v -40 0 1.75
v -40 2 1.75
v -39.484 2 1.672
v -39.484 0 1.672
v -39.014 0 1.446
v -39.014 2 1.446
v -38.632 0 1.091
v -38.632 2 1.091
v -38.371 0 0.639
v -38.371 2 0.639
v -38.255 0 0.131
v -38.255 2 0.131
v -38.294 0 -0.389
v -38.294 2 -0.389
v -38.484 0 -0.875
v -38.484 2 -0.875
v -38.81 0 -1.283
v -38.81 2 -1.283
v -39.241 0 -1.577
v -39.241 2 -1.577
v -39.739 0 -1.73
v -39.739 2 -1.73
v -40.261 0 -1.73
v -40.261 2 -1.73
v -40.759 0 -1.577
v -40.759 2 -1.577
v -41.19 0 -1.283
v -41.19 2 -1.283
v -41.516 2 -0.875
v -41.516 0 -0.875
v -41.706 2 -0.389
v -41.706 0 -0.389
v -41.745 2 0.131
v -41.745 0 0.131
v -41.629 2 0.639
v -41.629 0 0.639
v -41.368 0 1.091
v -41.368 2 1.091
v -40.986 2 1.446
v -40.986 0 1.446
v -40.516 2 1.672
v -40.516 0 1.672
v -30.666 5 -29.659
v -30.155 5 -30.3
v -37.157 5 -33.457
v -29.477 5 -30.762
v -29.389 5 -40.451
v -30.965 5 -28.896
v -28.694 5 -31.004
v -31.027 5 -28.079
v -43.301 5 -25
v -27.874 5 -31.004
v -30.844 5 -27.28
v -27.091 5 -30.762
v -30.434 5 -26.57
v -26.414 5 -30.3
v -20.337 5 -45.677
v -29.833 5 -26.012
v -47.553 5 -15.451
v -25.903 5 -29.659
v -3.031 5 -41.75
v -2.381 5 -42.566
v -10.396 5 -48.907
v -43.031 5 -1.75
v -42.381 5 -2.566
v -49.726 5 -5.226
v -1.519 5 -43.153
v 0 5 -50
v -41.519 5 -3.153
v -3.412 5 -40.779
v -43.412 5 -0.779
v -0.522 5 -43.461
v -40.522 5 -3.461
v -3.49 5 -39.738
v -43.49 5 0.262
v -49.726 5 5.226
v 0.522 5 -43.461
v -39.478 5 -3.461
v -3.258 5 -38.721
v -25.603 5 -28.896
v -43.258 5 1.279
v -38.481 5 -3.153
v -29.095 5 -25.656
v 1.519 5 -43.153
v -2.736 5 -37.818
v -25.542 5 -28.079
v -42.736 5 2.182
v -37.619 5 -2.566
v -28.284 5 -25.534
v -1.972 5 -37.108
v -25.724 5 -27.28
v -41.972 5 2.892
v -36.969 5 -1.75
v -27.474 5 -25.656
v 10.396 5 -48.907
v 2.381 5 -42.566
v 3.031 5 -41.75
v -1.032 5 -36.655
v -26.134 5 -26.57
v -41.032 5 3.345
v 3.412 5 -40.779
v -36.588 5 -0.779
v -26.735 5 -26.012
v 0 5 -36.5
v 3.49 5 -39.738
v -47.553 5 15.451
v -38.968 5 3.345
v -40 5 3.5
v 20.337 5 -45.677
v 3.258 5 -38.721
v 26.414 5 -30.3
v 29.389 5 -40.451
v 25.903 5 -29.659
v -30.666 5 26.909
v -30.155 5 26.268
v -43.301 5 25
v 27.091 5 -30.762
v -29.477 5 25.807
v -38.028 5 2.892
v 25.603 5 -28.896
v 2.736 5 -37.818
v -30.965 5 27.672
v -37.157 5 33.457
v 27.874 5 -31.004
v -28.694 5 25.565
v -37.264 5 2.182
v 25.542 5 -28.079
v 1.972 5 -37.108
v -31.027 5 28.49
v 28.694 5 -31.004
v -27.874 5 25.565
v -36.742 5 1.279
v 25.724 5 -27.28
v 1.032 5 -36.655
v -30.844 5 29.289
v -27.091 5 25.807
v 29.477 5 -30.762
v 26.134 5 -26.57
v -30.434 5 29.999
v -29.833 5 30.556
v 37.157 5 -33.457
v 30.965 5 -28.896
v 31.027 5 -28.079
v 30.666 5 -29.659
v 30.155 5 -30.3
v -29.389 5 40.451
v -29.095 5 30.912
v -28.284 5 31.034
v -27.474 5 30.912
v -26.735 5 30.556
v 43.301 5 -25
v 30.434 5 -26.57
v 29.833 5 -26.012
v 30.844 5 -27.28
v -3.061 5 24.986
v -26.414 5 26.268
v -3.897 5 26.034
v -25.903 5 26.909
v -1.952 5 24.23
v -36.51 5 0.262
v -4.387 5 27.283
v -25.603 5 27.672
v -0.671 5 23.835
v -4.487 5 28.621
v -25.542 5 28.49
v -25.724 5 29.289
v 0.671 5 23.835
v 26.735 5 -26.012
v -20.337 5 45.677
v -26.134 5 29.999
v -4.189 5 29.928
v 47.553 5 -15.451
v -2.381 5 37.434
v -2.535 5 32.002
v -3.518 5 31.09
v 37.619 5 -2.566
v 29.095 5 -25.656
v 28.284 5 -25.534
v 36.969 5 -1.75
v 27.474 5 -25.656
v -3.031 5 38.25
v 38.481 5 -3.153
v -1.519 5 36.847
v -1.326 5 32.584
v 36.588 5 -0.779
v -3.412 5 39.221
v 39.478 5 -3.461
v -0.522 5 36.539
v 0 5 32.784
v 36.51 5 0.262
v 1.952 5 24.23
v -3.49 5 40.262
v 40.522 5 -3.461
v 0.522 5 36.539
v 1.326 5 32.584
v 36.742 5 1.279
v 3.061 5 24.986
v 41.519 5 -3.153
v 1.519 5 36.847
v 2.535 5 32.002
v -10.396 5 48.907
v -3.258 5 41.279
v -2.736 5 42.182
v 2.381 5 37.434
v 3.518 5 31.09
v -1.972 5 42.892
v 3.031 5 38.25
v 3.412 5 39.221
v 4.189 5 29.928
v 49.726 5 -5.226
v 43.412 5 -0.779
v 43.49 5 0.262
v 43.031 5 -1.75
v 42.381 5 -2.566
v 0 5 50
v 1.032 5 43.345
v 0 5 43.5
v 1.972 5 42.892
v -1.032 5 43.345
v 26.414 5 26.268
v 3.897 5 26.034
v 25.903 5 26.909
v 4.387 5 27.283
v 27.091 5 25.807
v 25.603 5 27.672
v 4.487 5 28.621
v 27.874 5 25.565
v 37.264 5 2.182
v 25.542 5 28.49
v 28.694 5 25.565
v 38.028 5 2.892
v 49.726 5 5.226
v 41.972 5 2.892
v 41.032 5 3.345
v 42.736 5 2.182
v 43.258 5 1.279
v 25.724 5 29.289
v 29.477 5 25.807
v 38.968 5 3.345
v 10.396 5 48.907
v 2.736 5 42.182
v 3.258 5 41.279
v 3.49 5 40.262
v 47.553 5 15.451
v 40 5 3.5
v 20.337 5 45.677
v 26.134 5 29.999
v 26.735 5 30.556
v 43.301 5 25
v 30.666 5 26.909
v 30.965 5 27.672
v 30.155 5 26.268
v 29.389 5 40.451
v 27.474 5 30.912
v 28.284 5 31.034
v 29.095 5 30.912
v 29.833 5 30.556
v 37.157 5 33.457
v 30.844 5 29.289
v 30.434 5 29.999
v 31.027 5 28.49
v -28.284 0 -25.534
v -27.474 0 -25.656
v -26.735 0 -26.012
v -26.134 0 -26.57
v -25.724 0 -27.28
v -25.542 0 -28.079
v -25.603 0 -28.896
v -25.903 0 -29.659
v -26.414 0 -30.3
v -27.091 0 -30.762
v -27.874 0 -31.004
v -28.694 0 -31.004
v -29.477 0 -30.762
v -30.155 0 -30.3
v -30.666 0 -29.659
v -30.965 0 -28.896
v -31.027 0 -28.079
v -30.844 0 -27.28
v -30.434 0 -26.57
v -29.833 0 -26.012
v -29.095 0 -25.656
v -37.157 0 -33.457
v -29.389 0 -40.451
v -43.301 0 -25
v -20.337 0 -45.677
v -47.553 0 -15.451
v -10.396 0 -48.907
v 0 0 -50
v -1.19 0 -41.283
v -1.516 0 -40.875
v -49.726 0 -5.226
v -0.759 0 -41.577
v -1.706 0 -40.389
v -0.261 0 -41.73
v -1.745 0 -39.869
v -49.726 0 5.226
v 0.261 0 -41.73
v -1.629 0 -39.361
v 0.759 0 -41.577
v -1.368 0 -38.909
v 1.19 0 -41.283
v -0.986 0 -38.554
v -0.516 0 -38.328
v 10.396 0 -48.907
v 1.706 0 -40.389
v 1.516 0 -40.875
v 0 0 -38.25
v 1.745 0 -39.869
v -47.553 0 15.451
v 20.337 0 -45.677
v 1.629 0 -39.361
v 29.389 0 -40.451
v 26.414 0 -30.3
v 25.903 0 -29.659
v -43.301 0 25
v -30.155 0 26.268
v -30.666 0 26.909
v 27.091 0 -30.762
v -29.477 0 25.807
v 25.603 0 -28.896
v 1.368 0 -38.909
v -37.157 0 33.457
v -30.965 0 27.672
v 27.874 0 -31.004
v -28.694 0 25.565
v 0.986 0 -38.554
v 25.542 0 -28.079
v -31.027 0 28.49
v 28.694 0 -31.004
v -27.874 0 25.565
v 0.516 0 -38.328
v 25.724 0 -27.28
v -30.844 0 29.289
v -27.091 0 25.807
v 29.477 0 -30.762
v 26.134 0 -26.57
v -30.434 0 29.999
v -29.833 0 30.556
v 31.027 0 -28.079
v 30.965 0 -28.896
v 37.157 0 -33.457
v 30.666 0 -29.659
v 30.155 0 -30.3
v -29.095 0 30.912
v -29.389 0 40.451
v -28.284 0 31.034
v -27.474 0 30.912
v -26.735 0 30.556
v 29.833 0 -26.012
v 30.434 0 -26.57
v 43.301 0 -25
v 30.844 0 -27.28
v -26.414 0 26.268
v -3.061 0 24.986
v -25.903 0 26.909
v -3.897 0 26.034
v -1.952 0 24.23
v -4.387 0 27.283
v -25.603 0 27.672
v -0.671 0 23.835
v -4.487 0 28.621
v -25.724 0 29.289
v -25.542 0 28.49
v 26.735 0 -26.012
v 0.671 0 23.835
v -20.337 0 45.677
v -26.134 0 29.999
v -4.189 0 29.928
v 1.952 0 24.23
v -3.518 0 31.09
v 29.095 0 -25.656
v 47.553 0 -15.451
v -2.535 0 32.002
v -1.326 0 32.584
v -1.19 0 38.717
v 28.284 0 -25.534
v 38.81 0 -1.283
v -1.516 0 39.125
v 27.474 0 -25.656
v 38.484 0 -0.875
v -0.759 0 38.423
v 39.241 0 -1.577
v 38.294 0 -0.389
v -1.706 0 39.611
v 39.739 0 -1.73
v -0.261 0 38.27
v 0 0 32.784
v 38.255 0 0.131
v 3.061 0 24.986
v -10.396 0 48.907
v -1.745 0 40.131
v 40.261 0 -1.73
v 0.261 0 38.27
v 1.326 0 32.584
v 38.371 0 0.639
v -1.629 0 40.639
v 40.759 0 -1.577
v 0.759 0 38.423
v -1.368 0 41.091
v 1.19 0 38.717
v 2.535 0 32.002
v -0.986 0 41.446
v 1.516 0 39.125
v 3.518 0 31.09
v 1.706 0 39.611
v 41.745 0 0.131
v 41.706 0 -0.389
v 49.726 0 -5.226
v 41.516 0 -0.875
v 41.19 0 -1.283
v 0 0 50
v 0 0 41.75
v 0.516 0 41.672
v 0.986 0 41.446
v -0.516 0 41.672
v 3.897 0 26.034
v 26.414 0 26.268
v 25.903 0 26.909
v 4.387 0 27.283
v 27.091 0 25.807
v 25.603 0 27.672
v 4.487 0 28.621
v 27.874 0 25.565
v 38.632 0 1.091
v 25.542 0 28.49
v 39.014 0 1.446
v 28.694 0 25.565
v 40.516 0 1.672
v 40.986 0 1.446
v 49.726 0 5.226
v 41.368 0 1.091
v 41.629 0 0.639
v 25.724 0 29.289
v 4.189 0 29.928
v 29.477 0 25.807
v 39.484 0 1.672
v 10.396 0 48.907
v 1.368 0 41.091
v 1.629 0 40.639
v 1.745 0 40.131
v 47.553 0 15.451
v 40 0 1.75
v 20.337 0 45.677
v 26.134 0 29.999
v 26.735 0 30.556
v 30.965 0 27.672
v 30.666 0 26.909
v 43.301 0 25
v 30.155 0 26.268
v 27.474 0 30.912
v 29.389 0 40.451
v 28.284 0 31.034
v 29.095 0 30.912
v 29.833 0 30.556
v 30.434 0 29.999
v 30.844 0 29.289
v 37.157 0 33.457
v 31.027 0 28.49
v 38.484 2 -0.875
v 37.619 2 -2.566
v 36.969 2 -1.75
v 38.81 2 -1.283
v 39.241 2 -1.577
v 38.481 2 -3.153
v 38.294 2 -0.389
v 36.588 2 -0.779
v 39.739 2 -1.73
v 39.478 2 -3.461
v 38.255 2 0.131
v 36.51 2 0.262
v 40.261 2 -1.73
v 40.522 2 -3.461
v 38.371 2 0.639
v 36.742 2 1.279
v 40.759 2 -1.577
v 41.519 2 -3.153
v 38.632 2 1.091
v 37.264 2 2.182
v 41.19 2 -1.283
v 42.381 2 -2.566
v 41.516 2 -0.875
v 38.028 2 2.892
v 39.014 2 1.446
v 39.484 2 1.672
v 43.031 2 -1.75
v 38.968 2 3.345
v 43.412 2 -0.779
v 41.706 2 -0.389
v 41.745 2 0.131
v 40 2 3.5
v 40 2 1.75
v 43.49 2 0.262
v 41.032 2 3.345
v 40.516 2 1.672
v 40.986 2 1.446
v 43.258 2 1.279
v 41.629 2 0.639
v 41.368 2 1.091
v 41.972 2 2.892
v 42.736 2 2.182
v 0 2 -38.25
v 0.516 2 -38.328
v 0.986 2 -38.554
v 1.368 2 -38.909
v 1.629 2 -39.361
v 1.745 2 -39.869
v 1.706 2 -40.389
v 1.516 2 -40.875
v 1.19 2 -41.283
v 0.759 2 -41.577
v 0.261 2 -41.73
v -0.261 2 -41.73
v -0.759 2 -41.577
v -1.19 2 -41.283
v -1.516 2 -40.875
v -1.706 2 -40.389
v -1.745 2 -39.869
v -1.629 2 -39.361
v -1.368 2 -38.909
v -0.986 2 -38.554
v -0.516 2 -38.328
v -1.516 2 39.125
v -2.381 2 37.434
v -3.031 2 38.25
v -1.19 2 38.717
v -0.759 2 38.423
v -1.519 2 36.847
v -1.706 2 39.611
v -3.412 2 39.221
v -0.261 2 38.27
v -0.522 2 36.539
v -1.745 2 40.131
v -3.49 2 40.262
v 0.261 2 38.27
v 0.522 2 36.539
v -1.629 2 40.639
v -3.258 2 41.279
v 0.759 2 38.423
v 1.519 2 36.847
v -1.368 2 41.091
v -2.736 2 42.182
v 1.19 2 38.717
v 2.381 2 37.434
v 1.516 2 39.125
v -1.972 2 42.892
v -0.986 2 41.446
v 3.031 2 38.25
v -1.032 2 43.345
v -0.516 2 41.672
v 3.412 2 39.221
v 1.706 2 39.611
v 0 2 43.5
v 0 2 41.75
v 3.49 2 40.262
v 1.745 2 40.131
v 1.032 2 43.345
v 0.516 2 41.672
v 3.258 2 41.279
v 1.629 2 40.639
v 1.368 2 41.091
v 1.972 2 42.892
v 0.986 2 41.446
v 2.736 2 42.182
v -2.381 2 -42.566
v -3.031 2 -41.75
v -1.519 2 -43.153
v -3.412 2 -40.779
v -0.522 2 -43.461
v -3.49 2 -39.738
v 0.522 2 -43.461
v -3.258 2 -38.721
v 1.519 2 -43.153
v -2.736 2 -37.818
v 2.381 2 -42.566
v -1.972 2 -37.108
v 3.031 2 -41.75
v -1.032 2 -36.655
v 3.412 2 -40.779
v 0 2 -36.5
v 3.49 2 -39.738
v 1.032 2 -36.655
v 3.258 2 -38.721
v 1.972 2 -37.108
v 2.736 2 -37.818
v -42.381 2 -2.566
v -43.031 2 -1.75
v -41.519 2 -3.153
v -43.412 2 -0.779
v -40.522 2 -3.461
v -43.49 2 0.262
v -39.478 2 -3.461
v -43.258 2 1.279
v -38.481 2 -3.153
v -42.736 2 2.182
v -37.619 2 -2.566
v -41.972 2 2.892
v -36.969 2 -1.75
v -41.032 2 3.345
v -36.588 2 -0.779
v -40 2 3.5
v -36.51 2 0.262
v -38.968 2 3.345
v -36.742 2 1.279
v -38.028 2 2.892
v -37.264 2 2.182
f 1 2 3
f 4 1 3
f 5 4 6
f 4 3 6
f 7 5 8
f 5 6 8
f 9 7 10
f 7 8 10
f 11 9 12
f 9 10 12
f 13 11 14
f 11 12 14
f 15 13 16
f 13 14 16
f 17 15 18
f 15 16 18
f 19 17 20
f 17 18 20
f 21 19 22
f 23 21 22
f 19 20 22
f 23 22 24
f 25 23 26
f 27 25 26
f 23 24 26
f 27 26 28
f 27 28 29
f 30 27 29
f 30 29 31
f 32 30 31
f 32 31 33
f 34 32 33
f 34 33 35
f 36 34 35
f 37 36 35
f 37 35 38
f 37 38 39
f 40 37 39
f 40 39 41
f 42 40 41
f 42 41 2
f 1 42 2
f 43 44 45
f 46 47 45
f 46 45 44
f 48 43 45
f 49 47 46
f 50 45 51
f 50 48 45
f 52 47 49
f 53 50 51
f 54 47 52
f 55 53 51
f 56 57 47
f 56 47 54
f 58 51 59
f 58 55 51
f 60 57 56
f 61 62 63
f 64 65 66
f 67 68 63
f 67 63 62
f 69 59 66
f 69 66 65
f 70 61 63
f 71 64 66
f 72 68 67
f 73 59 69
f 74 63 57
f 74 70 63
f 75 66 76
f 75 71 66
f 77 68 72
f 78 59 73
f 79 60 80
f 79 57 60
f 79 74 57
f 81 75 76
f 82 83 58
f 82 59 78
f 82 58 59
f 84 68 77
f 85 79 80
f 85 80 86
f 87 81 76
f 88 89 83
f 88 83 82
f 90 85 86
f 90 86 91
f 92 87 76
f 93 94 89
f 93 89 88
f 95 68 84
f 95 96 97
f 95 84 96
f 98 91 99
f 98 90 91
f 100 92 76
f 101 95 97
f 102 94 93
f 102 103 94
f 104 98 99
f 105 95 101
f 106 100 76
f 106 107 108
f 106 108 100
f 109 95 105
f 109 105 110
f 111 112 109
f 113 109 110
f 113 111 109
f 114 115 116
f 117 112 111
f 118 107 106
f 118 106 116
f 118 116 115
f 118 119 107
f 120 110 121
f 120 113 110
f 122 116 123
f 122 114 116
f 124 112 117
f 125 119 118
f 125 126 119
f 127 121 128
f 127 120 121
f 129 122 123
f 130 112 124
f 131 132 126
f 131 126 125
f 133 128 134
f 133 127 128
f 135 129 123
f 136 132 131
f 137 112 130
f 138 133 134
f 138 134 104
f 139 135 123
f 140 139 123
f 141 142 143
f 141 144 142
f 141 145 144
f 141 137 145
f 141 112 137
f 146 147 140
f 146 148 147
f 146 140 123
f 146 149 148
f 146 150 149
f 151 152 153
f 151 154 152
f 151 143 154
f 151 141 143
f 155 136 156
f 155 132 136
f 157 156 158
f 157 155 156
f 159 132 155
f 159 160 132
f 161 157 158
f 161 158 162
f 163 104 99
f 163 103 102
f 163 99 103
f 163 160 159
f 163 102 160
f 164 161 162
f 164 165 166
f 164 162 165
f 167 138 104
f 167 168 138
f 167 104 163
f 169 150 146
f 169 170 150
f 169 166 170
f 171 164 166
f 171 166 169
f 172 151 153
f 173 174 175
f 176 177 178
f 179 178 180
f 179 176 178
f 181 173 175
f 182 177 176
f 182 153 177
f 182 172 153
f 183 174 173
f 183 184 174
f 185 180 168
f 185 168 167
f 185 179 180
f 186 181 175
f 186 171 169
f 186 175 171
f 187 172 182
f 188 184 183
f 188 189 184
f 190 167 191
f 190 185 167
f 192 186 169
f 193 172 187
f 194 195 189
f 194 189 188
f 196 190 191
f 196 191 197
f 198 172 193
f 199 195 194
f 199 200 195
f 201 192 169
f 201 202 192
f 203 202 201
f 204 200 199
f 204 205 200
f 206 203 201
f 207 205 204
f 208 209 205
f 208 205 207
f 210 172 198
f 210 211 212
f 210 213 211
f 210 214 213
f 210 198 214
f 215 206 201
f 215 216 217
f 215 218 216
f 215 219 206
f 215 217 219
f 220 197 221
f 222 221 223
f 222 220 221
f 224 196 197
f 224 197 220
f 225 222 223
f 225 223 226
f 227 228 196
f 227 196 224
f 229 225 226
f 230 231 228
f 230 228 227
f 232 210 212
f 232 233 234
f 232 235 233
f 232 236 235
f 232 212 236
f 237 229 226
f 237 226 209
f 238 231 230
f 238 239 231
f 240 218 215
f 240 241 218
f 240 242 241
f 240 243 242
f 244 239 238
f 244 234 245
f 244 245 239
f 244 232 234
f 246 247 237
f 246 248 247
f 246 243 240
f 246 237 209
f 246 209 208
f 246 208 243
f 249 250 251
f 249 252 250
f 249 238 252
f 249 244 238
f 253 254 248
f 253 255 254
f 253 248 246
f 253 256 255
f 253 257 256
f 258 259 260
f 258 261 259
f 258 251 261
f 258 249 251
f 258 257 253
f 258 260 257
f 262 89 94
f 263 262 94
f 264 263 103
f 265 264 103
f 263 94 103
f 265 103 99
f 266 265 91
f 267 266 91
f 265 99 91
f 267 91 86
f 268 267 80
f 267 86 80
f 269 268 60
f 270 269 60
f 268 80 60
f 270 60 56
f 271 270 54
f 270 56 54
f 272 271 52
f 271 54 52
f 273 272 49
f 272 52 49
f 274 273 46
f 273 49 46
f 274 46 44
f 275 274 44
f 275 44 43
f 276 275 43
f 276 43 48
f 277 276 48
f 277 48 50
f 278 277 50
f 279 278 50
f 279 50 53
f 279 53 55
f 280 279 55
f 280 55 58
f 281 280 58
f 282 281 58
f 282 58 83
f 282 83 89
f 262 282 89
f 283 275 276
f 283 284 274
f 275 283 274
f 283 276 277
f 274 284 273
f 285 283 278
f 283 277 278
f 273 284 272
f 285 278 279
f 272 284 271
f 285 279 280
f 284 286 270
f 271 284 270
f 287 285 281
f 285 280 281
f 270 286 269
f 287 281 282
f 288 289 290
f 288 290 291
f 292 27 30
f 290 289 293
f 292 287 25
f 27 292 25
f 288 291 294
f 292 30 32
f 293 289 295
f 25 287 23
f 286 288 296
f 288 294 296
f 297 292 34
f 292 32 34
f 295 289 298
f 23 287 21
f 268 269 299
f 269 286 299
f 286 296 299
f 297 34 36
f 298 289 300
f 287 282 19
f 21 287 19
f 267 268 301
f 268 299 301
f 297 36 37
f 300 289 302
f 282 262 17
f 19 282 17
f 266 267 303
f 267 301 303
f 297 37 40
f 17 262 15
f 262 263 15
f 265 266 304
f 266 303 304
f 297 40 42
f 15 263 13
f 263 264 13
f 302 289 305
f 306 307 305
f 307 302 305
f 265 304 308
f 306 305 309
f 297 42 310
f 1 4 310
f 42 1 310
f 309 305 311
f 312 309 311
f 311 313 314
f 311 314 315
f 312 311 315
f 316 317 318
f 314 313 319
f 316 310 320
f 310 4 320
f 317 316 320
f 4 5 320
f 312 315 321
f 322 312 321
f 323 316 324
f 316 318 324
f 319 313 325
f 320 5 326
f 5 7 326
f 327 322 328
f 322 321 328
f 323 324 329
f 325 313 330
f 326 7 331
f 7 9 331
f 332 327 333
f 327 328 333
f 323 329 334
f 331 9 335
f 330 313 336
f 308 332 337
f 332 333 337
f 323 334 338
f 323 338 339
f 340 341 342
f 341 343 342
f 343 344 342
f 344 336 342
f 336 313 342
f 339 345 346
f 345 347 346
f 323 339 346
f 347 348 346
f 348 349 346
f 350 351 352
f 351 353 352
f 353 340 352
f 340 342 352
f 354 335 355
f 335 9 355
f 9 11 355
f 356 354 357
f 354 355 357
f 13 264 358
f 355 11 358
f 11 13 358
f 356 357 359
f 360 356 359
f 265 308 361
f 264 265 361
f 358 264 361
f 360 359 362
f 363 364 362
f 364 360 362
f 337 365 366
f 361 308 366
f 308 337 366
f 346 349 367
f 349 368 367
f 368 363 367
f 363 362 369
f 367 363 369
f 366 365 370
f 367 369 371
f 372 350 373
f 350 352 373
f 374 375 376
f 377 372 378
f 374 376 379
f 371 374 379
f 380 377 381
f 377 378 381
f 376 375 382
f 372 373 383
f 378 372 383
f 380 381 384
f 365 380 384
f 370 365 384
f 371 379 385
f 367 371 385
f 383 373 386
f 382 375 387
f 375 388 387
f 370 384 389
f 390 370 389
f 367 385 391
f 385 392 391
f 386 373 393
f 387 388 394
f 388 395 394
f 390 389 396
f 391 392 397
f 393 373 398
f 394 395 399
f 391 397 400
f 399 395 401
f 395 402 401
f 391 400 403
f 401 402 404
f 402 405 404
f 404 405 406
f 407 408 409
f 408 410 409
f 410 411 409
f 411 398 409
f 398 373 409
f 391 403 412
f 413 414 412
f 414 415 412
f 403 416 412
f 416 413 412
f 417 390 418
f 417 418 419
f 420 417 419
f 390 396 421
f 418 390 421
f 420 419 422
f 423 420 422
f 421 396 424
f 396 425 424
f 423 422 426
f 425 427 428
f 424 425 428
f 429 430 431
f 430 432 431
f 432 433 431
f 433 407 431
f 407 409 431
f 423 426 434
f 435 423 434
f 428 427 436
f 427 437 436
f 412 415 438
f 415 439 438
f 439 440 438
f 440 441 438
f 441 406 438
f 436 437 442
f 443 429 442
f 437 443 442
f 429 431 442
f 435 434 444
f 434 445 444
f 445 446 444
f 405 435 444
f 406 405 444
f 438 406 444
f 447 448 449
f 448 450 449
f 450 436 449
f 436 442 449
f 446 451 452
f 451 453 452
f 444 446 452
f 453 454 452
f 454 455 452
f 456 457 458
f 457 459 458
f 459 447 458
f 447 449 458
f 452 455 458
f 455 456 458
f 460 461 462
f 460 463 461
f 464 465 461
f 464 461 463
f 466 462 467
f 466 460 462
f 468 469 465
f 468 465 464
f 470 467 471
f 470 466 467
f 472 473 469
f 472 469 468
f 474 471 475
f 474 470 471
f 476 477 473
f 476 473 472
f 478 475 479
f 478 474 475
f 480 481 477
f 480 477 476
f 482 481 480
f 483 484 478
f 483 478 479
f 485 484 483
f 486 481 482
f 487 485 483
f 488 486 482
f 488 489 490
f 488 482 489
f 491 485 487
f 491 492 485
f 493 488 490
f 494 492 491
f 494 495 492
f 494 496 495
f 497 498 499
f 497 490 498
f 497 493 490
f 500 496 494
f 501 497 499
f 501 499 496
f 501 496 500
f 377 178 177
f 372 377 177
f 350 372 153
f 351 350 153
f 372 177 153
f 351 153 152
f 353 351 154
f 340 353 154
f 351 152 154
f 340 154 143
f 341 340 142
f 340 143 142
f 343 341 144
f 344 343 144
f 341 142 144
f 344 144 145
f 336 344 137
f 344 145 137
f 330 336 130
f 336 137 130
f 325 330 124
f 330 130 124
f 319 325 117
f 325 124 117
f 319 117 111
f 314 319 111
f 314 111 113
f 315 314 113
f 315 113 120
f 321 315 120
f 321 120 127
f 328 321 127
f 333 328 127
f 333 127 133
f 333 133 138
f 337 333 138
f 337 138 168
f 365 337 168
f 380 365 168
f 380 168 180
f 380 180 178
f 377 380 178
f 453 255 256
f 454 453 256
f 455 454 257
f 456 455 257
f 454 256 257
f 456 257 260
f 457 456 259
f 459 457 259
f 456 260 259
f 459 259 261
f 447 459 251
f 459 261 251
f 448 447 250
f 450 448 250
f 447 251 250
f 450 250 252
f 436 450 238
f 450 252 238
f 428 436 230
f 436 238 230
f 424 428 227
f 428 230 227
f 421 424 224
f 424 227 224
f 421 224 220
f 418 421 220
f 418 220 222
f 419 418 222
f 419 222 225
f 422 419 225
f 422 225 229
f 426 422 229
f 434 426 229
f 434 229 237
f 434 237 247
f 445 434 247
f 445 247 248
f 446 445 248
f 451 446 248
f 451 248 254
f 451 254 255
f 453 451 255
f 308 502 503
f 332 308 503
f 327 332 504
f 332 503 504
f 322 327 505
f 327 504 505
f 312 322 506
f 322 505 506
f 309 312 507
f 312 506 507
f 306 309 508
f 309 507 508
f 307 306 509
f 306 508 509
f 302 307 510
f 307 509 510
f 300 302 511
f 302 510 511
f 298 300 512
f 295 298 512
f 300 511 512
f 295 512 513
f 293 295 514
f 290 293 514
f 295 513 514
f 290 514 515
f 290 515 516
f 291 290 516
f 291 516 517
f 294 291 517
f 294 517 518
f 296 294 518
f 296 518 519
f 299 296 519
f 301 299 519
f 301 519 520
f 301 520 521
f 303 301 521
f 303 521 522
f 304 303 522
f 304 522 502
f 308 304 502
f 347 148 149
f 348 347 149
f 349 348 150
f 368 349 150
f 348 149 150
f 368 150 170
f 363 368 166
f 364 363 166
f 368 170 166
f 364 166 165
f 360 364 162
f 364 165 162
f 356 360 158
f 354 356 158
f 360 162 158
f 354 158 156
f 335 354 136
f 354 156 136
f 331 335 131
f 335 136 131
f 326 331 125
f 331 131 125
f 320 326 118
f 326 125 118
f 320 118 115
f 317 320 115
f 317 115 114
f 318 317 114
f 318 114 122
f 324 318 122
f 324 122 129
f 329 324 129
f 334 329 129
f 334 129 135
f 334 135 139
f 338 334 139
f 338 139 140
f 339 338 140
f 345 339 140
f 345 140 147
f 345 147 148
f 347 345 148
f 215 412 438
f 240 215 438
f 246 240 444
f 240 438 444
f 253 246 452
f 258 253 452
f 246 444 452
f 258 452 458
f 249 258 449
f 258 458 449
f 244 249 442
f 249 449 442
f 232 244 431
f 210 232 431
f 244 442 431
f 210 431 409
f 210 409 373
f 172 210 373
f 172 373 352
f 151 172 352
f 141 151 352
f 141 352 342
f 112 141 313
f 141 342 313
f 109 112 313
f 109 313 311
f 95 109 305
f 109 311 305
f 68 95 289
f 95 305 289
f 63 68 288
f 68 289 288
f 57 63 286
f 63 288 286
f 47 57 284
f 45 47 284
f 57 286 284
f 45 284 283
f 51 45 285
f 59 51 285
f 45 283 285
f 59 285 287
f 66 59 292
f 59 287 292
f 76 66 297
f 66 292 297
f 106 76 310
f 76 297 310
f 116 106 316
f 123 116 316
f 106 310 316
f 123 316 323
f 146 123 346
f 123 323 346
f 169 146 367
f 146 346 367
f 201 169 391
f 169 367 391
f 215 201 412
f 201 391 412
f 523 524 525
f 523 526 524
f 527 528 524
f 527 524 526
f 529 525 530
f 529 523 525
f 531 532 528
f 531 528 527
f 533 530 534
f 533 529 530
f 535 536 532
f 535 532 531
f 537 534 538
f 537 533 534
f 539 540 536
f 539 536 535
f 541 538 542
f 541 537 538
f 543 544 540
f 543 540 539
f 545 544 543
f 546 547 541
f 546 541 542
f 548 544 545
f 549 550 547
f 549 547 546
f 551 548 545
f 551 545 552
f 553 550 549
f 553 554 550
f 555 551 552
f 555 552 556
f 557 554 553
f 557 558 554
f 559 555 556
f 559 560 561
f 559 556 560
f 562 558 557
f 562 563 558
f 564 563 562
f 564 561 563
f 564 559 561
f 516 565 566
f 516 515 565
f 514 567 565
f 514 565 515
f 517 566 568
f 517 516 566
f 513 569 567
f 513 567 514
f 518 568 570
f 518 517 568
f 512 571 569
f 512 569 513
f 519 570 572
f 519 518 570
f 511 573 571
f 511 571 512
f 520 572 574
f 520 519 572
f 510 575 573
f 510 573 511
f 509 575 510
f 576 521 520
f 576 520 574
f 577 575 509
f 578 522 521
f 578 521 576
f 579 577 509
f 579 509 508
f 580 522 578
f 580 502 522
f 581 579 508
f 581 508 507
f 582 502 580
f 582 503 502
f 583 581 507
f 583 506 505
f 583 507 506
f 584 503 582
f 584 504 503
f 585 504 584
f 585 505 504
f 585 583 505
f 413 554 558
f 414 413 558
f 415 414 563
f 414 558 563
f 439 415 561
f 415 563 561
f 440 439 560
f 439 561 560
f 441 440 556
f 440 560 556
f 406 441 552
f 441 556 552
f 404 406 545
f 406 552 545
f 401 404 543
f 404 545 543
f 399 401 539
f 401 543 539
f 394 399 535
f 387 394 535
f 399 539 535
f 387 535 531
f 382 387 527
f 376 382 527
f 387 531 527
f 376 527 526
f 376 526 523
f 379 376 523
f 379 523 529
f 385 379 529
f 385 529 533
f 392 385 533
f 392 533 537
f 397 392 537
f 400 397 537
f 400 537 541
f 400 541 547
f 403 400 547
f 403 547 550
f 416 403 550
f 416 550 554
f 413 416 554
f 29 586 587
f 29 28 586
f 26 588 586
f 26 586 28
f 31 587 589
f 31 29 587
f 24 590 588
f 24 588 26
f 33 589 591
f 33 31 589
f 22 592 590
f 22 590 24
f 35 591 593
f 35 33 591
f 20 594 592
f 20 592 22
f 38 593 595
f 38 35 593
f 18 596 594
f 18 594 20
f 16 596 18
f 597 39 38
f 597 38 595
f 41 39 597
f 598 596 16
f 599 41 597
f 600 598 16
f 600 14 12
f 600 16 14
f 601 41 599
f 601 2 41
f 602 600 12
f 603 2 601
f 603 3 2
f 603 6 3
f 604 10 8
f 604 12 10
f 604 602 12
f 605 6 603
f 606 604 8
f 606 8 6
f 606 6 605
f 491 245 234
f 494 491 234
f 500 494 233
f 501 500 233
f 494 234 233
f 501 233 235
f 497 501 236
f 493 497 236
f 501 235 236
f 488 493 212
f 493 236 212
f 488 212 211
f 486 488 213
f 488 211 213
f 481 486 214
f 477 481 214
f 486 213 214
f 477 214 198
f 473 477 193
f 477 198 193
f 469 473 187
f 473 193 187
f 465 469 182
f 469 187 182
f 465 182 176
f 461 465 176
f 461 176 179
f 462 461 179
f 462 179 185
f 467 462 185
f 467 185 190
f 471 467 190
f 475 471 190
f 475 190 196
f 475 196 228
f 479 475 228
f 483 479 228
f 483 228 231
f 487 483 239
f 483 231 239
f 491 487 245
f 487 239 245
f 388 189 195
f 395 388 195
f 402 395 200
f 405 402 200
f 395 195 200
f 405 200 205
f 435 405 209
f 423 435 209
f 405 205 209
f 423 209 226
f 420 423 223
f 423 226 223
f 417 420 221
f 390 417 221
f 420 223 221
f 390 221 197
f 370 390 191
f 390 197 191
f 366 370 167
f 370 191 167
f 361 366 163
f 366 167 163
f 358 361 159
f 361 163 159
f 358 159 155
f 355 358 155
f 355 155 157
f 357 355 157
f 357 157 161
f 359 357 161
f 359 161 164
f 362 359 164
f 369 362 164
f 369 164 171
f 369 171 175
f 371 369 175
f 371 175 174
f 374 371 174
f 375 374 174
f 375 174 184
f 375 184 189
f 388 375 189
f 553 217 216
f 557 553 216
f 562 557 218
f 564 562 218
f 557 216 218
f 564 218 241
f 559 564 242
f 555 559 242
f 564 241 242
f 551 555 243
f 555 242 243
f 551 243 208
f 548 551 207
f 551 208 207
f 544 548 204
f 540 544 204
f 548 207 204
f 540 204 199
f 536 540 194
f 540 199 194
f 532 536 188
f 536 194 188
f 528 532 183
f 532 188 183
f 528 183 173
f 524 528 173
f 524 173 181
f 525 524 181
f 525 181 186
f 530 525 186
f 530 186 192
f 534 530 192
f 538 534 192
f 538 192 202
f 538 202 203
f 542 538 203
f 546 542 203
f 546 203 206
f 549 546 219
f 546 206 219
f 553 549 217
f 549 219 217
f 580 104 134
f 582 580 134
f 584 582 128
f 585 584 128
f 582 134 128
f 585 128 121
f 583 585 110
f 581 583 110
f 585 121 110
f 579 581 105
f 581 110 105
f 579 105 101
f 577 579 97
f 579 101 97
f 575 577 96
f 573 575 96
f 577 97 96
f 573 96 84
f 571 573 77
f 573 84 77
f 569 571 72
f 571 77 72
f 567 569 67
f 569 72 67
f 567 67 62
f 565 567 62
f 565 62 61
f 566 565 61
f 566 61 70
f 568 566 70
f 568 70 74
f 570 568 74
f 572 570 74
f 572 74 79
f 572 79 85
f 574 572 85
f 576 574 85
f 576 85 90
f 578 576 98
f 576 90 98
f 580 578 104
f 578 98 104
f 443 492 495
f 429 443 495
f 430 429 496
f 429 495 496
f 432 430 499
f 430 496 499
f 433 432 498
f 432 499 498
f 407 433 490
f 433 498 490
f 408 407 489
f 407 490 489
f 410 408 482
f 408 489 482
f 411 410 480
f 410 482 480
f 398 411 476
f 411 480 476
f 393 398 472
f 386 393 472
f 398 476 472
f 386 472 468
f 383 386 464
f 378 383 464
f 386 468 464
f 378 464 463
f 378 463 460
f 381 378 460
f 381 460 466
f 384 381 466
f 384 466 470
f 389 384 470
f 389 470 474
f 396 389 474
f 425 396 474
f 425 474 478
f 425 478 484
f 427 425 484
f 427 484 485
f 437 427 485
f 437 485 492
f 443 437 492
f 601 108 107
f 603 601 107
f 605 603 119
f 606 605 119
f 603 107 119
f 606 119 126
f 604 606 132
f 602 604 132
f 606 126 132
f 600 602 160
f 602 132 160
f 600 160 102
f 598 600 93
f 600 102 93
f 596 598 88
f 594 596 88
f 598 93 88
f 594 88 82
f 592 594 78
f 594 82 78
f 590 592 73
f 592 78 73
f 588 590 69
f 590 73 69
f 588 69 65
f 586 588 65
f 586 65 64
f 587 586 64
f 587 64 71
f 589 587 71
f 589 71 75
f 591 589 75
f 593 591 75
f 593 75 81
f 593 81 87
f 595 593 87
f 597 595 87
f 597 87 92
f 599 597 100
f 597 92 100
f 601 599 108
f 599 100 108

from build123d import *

# Parameters (mm, degrees)
SKETCH_1_R          = 50
EXTRUDE_1_DEPTH     = 5
SKETCH_2_R          = 1.75
CUT_EXTRUDE_1_DEPTH = 12
SKETCH_3_R          = 3.5
CUT_EXTRUDE_2_DEPTH = 3
SKETCH_4_R          = 2.75
CUT_EXTRUDE_3_DEPTH = 24
SKETCH_5_R          = 4.5
CUT_EXTRUDE_4_DEPTH = 16


with BuildPart() as part:
    # 草图1 → 凸台-拉伸1 (new body)
    with BuildSketch(Plane(origin=(0, 0, 0), x_dir=(1, 0, 0), z_dir=(0, 1, 0))):
        with Locations(Location((0, 0, 0), (0, 0, 270))):
            Circle(SKETCH_1_R)
    extrude(amount=EXTRUDE_1_DEPTH)

    # 草图2 → 切除-拉伸1 (cut)
    with BuildSketch(Plane(origin=(0, 5, 0), x_dir=(1, 0, 0), z_dir=(0, 1, 0))):
        with Locations(Location((0, 40, 0), (0, 0, 270))):
            Circle(SKETCH_2_R)
        with Locations(Location((40, 0, 0), (0, 0, 270))):
            Circle(SKETCH_2_R)
        with Locations(Location((0, -40, 0), (0, 0, 270))):
            Circle(SKETCH_2_R)
        with Locations(Location((-40, 0, 0), (0, 0, 270))):
            Circle(SKETCH_2_R)
    extrude(amount=-CUT_EXTRUDE_1_DEPTH, mode=Mode.SUBTRACT)

    # 草图3 → 切除-拉伸2 (cut)
    with BuildSketch(Plane(origin=(0, 5, 0), x_dir=(1, 0, 0), z_dir=(0, 1, 0))):
        with Locations(Location((0, 40, 0), (0, 0, 270))):
            Circle(SKETCH_3_R)
        with Locations(Location((40, 0, 0), (0, 0, 270))):
            Circle(SKETCH_3_R)
        with Locations(Location((0, -40, 0), (0, 0, 270))):
            Circle(SKETCH_3_R)
        with Locations(Location((-40, 0, 0), (0, 0, 270))):
            Circle(SKETCH_3_R)
    extrude(amount=-CUT_EXTRUDE_2_DEPTH, mode=Mode.SUBTRACT)

    # 草图4 → 切除-拉伸3 (cut)
    with BuildSketch(Plane(origin=(0, 5, 0), x_dir=(1, 0, 0), z_dir=(0, 1, 0))):
        with Locations(Location((28.284271247, 28.284271247, 0), (0, 0, 270))):
            Circle(SKETCH_4_R)
        with Locations(Location((28.284271247, -28.284271247, 0), (0, 0, 270))):
            Circle(SKETCH_4_R)
        with Locations(Location((-28.284271247, -28.284271247, 0), (0, 0, 270))):
            Circle(SKETCH_4_R)
        with Locations(Location((-28.284271247, 28.284271247, 0), (0, 0, 270))):
            Circle(SKETCH_4_R)
    extrude(amount=-CUT_EXTRUDE_3_DEPTH, mode=Mode.SUBTRACT)

    # 草图5 → 切除-拉伸4 (cut)
    with BuildSketch(Plane(origin=(0, 5, 0), x_dir=(1, 0, 0), z_dir=(0, 1, 0))):
        with Locations(Location((0, -28.284271247, 0), (0, 0, 270))):
            Circle(SKETCH_5_R)
    extrude(amount=-CUT_EXTRUDE_4_DEPTH, mode=Mode.SUBTRACT)


solid = part.part
